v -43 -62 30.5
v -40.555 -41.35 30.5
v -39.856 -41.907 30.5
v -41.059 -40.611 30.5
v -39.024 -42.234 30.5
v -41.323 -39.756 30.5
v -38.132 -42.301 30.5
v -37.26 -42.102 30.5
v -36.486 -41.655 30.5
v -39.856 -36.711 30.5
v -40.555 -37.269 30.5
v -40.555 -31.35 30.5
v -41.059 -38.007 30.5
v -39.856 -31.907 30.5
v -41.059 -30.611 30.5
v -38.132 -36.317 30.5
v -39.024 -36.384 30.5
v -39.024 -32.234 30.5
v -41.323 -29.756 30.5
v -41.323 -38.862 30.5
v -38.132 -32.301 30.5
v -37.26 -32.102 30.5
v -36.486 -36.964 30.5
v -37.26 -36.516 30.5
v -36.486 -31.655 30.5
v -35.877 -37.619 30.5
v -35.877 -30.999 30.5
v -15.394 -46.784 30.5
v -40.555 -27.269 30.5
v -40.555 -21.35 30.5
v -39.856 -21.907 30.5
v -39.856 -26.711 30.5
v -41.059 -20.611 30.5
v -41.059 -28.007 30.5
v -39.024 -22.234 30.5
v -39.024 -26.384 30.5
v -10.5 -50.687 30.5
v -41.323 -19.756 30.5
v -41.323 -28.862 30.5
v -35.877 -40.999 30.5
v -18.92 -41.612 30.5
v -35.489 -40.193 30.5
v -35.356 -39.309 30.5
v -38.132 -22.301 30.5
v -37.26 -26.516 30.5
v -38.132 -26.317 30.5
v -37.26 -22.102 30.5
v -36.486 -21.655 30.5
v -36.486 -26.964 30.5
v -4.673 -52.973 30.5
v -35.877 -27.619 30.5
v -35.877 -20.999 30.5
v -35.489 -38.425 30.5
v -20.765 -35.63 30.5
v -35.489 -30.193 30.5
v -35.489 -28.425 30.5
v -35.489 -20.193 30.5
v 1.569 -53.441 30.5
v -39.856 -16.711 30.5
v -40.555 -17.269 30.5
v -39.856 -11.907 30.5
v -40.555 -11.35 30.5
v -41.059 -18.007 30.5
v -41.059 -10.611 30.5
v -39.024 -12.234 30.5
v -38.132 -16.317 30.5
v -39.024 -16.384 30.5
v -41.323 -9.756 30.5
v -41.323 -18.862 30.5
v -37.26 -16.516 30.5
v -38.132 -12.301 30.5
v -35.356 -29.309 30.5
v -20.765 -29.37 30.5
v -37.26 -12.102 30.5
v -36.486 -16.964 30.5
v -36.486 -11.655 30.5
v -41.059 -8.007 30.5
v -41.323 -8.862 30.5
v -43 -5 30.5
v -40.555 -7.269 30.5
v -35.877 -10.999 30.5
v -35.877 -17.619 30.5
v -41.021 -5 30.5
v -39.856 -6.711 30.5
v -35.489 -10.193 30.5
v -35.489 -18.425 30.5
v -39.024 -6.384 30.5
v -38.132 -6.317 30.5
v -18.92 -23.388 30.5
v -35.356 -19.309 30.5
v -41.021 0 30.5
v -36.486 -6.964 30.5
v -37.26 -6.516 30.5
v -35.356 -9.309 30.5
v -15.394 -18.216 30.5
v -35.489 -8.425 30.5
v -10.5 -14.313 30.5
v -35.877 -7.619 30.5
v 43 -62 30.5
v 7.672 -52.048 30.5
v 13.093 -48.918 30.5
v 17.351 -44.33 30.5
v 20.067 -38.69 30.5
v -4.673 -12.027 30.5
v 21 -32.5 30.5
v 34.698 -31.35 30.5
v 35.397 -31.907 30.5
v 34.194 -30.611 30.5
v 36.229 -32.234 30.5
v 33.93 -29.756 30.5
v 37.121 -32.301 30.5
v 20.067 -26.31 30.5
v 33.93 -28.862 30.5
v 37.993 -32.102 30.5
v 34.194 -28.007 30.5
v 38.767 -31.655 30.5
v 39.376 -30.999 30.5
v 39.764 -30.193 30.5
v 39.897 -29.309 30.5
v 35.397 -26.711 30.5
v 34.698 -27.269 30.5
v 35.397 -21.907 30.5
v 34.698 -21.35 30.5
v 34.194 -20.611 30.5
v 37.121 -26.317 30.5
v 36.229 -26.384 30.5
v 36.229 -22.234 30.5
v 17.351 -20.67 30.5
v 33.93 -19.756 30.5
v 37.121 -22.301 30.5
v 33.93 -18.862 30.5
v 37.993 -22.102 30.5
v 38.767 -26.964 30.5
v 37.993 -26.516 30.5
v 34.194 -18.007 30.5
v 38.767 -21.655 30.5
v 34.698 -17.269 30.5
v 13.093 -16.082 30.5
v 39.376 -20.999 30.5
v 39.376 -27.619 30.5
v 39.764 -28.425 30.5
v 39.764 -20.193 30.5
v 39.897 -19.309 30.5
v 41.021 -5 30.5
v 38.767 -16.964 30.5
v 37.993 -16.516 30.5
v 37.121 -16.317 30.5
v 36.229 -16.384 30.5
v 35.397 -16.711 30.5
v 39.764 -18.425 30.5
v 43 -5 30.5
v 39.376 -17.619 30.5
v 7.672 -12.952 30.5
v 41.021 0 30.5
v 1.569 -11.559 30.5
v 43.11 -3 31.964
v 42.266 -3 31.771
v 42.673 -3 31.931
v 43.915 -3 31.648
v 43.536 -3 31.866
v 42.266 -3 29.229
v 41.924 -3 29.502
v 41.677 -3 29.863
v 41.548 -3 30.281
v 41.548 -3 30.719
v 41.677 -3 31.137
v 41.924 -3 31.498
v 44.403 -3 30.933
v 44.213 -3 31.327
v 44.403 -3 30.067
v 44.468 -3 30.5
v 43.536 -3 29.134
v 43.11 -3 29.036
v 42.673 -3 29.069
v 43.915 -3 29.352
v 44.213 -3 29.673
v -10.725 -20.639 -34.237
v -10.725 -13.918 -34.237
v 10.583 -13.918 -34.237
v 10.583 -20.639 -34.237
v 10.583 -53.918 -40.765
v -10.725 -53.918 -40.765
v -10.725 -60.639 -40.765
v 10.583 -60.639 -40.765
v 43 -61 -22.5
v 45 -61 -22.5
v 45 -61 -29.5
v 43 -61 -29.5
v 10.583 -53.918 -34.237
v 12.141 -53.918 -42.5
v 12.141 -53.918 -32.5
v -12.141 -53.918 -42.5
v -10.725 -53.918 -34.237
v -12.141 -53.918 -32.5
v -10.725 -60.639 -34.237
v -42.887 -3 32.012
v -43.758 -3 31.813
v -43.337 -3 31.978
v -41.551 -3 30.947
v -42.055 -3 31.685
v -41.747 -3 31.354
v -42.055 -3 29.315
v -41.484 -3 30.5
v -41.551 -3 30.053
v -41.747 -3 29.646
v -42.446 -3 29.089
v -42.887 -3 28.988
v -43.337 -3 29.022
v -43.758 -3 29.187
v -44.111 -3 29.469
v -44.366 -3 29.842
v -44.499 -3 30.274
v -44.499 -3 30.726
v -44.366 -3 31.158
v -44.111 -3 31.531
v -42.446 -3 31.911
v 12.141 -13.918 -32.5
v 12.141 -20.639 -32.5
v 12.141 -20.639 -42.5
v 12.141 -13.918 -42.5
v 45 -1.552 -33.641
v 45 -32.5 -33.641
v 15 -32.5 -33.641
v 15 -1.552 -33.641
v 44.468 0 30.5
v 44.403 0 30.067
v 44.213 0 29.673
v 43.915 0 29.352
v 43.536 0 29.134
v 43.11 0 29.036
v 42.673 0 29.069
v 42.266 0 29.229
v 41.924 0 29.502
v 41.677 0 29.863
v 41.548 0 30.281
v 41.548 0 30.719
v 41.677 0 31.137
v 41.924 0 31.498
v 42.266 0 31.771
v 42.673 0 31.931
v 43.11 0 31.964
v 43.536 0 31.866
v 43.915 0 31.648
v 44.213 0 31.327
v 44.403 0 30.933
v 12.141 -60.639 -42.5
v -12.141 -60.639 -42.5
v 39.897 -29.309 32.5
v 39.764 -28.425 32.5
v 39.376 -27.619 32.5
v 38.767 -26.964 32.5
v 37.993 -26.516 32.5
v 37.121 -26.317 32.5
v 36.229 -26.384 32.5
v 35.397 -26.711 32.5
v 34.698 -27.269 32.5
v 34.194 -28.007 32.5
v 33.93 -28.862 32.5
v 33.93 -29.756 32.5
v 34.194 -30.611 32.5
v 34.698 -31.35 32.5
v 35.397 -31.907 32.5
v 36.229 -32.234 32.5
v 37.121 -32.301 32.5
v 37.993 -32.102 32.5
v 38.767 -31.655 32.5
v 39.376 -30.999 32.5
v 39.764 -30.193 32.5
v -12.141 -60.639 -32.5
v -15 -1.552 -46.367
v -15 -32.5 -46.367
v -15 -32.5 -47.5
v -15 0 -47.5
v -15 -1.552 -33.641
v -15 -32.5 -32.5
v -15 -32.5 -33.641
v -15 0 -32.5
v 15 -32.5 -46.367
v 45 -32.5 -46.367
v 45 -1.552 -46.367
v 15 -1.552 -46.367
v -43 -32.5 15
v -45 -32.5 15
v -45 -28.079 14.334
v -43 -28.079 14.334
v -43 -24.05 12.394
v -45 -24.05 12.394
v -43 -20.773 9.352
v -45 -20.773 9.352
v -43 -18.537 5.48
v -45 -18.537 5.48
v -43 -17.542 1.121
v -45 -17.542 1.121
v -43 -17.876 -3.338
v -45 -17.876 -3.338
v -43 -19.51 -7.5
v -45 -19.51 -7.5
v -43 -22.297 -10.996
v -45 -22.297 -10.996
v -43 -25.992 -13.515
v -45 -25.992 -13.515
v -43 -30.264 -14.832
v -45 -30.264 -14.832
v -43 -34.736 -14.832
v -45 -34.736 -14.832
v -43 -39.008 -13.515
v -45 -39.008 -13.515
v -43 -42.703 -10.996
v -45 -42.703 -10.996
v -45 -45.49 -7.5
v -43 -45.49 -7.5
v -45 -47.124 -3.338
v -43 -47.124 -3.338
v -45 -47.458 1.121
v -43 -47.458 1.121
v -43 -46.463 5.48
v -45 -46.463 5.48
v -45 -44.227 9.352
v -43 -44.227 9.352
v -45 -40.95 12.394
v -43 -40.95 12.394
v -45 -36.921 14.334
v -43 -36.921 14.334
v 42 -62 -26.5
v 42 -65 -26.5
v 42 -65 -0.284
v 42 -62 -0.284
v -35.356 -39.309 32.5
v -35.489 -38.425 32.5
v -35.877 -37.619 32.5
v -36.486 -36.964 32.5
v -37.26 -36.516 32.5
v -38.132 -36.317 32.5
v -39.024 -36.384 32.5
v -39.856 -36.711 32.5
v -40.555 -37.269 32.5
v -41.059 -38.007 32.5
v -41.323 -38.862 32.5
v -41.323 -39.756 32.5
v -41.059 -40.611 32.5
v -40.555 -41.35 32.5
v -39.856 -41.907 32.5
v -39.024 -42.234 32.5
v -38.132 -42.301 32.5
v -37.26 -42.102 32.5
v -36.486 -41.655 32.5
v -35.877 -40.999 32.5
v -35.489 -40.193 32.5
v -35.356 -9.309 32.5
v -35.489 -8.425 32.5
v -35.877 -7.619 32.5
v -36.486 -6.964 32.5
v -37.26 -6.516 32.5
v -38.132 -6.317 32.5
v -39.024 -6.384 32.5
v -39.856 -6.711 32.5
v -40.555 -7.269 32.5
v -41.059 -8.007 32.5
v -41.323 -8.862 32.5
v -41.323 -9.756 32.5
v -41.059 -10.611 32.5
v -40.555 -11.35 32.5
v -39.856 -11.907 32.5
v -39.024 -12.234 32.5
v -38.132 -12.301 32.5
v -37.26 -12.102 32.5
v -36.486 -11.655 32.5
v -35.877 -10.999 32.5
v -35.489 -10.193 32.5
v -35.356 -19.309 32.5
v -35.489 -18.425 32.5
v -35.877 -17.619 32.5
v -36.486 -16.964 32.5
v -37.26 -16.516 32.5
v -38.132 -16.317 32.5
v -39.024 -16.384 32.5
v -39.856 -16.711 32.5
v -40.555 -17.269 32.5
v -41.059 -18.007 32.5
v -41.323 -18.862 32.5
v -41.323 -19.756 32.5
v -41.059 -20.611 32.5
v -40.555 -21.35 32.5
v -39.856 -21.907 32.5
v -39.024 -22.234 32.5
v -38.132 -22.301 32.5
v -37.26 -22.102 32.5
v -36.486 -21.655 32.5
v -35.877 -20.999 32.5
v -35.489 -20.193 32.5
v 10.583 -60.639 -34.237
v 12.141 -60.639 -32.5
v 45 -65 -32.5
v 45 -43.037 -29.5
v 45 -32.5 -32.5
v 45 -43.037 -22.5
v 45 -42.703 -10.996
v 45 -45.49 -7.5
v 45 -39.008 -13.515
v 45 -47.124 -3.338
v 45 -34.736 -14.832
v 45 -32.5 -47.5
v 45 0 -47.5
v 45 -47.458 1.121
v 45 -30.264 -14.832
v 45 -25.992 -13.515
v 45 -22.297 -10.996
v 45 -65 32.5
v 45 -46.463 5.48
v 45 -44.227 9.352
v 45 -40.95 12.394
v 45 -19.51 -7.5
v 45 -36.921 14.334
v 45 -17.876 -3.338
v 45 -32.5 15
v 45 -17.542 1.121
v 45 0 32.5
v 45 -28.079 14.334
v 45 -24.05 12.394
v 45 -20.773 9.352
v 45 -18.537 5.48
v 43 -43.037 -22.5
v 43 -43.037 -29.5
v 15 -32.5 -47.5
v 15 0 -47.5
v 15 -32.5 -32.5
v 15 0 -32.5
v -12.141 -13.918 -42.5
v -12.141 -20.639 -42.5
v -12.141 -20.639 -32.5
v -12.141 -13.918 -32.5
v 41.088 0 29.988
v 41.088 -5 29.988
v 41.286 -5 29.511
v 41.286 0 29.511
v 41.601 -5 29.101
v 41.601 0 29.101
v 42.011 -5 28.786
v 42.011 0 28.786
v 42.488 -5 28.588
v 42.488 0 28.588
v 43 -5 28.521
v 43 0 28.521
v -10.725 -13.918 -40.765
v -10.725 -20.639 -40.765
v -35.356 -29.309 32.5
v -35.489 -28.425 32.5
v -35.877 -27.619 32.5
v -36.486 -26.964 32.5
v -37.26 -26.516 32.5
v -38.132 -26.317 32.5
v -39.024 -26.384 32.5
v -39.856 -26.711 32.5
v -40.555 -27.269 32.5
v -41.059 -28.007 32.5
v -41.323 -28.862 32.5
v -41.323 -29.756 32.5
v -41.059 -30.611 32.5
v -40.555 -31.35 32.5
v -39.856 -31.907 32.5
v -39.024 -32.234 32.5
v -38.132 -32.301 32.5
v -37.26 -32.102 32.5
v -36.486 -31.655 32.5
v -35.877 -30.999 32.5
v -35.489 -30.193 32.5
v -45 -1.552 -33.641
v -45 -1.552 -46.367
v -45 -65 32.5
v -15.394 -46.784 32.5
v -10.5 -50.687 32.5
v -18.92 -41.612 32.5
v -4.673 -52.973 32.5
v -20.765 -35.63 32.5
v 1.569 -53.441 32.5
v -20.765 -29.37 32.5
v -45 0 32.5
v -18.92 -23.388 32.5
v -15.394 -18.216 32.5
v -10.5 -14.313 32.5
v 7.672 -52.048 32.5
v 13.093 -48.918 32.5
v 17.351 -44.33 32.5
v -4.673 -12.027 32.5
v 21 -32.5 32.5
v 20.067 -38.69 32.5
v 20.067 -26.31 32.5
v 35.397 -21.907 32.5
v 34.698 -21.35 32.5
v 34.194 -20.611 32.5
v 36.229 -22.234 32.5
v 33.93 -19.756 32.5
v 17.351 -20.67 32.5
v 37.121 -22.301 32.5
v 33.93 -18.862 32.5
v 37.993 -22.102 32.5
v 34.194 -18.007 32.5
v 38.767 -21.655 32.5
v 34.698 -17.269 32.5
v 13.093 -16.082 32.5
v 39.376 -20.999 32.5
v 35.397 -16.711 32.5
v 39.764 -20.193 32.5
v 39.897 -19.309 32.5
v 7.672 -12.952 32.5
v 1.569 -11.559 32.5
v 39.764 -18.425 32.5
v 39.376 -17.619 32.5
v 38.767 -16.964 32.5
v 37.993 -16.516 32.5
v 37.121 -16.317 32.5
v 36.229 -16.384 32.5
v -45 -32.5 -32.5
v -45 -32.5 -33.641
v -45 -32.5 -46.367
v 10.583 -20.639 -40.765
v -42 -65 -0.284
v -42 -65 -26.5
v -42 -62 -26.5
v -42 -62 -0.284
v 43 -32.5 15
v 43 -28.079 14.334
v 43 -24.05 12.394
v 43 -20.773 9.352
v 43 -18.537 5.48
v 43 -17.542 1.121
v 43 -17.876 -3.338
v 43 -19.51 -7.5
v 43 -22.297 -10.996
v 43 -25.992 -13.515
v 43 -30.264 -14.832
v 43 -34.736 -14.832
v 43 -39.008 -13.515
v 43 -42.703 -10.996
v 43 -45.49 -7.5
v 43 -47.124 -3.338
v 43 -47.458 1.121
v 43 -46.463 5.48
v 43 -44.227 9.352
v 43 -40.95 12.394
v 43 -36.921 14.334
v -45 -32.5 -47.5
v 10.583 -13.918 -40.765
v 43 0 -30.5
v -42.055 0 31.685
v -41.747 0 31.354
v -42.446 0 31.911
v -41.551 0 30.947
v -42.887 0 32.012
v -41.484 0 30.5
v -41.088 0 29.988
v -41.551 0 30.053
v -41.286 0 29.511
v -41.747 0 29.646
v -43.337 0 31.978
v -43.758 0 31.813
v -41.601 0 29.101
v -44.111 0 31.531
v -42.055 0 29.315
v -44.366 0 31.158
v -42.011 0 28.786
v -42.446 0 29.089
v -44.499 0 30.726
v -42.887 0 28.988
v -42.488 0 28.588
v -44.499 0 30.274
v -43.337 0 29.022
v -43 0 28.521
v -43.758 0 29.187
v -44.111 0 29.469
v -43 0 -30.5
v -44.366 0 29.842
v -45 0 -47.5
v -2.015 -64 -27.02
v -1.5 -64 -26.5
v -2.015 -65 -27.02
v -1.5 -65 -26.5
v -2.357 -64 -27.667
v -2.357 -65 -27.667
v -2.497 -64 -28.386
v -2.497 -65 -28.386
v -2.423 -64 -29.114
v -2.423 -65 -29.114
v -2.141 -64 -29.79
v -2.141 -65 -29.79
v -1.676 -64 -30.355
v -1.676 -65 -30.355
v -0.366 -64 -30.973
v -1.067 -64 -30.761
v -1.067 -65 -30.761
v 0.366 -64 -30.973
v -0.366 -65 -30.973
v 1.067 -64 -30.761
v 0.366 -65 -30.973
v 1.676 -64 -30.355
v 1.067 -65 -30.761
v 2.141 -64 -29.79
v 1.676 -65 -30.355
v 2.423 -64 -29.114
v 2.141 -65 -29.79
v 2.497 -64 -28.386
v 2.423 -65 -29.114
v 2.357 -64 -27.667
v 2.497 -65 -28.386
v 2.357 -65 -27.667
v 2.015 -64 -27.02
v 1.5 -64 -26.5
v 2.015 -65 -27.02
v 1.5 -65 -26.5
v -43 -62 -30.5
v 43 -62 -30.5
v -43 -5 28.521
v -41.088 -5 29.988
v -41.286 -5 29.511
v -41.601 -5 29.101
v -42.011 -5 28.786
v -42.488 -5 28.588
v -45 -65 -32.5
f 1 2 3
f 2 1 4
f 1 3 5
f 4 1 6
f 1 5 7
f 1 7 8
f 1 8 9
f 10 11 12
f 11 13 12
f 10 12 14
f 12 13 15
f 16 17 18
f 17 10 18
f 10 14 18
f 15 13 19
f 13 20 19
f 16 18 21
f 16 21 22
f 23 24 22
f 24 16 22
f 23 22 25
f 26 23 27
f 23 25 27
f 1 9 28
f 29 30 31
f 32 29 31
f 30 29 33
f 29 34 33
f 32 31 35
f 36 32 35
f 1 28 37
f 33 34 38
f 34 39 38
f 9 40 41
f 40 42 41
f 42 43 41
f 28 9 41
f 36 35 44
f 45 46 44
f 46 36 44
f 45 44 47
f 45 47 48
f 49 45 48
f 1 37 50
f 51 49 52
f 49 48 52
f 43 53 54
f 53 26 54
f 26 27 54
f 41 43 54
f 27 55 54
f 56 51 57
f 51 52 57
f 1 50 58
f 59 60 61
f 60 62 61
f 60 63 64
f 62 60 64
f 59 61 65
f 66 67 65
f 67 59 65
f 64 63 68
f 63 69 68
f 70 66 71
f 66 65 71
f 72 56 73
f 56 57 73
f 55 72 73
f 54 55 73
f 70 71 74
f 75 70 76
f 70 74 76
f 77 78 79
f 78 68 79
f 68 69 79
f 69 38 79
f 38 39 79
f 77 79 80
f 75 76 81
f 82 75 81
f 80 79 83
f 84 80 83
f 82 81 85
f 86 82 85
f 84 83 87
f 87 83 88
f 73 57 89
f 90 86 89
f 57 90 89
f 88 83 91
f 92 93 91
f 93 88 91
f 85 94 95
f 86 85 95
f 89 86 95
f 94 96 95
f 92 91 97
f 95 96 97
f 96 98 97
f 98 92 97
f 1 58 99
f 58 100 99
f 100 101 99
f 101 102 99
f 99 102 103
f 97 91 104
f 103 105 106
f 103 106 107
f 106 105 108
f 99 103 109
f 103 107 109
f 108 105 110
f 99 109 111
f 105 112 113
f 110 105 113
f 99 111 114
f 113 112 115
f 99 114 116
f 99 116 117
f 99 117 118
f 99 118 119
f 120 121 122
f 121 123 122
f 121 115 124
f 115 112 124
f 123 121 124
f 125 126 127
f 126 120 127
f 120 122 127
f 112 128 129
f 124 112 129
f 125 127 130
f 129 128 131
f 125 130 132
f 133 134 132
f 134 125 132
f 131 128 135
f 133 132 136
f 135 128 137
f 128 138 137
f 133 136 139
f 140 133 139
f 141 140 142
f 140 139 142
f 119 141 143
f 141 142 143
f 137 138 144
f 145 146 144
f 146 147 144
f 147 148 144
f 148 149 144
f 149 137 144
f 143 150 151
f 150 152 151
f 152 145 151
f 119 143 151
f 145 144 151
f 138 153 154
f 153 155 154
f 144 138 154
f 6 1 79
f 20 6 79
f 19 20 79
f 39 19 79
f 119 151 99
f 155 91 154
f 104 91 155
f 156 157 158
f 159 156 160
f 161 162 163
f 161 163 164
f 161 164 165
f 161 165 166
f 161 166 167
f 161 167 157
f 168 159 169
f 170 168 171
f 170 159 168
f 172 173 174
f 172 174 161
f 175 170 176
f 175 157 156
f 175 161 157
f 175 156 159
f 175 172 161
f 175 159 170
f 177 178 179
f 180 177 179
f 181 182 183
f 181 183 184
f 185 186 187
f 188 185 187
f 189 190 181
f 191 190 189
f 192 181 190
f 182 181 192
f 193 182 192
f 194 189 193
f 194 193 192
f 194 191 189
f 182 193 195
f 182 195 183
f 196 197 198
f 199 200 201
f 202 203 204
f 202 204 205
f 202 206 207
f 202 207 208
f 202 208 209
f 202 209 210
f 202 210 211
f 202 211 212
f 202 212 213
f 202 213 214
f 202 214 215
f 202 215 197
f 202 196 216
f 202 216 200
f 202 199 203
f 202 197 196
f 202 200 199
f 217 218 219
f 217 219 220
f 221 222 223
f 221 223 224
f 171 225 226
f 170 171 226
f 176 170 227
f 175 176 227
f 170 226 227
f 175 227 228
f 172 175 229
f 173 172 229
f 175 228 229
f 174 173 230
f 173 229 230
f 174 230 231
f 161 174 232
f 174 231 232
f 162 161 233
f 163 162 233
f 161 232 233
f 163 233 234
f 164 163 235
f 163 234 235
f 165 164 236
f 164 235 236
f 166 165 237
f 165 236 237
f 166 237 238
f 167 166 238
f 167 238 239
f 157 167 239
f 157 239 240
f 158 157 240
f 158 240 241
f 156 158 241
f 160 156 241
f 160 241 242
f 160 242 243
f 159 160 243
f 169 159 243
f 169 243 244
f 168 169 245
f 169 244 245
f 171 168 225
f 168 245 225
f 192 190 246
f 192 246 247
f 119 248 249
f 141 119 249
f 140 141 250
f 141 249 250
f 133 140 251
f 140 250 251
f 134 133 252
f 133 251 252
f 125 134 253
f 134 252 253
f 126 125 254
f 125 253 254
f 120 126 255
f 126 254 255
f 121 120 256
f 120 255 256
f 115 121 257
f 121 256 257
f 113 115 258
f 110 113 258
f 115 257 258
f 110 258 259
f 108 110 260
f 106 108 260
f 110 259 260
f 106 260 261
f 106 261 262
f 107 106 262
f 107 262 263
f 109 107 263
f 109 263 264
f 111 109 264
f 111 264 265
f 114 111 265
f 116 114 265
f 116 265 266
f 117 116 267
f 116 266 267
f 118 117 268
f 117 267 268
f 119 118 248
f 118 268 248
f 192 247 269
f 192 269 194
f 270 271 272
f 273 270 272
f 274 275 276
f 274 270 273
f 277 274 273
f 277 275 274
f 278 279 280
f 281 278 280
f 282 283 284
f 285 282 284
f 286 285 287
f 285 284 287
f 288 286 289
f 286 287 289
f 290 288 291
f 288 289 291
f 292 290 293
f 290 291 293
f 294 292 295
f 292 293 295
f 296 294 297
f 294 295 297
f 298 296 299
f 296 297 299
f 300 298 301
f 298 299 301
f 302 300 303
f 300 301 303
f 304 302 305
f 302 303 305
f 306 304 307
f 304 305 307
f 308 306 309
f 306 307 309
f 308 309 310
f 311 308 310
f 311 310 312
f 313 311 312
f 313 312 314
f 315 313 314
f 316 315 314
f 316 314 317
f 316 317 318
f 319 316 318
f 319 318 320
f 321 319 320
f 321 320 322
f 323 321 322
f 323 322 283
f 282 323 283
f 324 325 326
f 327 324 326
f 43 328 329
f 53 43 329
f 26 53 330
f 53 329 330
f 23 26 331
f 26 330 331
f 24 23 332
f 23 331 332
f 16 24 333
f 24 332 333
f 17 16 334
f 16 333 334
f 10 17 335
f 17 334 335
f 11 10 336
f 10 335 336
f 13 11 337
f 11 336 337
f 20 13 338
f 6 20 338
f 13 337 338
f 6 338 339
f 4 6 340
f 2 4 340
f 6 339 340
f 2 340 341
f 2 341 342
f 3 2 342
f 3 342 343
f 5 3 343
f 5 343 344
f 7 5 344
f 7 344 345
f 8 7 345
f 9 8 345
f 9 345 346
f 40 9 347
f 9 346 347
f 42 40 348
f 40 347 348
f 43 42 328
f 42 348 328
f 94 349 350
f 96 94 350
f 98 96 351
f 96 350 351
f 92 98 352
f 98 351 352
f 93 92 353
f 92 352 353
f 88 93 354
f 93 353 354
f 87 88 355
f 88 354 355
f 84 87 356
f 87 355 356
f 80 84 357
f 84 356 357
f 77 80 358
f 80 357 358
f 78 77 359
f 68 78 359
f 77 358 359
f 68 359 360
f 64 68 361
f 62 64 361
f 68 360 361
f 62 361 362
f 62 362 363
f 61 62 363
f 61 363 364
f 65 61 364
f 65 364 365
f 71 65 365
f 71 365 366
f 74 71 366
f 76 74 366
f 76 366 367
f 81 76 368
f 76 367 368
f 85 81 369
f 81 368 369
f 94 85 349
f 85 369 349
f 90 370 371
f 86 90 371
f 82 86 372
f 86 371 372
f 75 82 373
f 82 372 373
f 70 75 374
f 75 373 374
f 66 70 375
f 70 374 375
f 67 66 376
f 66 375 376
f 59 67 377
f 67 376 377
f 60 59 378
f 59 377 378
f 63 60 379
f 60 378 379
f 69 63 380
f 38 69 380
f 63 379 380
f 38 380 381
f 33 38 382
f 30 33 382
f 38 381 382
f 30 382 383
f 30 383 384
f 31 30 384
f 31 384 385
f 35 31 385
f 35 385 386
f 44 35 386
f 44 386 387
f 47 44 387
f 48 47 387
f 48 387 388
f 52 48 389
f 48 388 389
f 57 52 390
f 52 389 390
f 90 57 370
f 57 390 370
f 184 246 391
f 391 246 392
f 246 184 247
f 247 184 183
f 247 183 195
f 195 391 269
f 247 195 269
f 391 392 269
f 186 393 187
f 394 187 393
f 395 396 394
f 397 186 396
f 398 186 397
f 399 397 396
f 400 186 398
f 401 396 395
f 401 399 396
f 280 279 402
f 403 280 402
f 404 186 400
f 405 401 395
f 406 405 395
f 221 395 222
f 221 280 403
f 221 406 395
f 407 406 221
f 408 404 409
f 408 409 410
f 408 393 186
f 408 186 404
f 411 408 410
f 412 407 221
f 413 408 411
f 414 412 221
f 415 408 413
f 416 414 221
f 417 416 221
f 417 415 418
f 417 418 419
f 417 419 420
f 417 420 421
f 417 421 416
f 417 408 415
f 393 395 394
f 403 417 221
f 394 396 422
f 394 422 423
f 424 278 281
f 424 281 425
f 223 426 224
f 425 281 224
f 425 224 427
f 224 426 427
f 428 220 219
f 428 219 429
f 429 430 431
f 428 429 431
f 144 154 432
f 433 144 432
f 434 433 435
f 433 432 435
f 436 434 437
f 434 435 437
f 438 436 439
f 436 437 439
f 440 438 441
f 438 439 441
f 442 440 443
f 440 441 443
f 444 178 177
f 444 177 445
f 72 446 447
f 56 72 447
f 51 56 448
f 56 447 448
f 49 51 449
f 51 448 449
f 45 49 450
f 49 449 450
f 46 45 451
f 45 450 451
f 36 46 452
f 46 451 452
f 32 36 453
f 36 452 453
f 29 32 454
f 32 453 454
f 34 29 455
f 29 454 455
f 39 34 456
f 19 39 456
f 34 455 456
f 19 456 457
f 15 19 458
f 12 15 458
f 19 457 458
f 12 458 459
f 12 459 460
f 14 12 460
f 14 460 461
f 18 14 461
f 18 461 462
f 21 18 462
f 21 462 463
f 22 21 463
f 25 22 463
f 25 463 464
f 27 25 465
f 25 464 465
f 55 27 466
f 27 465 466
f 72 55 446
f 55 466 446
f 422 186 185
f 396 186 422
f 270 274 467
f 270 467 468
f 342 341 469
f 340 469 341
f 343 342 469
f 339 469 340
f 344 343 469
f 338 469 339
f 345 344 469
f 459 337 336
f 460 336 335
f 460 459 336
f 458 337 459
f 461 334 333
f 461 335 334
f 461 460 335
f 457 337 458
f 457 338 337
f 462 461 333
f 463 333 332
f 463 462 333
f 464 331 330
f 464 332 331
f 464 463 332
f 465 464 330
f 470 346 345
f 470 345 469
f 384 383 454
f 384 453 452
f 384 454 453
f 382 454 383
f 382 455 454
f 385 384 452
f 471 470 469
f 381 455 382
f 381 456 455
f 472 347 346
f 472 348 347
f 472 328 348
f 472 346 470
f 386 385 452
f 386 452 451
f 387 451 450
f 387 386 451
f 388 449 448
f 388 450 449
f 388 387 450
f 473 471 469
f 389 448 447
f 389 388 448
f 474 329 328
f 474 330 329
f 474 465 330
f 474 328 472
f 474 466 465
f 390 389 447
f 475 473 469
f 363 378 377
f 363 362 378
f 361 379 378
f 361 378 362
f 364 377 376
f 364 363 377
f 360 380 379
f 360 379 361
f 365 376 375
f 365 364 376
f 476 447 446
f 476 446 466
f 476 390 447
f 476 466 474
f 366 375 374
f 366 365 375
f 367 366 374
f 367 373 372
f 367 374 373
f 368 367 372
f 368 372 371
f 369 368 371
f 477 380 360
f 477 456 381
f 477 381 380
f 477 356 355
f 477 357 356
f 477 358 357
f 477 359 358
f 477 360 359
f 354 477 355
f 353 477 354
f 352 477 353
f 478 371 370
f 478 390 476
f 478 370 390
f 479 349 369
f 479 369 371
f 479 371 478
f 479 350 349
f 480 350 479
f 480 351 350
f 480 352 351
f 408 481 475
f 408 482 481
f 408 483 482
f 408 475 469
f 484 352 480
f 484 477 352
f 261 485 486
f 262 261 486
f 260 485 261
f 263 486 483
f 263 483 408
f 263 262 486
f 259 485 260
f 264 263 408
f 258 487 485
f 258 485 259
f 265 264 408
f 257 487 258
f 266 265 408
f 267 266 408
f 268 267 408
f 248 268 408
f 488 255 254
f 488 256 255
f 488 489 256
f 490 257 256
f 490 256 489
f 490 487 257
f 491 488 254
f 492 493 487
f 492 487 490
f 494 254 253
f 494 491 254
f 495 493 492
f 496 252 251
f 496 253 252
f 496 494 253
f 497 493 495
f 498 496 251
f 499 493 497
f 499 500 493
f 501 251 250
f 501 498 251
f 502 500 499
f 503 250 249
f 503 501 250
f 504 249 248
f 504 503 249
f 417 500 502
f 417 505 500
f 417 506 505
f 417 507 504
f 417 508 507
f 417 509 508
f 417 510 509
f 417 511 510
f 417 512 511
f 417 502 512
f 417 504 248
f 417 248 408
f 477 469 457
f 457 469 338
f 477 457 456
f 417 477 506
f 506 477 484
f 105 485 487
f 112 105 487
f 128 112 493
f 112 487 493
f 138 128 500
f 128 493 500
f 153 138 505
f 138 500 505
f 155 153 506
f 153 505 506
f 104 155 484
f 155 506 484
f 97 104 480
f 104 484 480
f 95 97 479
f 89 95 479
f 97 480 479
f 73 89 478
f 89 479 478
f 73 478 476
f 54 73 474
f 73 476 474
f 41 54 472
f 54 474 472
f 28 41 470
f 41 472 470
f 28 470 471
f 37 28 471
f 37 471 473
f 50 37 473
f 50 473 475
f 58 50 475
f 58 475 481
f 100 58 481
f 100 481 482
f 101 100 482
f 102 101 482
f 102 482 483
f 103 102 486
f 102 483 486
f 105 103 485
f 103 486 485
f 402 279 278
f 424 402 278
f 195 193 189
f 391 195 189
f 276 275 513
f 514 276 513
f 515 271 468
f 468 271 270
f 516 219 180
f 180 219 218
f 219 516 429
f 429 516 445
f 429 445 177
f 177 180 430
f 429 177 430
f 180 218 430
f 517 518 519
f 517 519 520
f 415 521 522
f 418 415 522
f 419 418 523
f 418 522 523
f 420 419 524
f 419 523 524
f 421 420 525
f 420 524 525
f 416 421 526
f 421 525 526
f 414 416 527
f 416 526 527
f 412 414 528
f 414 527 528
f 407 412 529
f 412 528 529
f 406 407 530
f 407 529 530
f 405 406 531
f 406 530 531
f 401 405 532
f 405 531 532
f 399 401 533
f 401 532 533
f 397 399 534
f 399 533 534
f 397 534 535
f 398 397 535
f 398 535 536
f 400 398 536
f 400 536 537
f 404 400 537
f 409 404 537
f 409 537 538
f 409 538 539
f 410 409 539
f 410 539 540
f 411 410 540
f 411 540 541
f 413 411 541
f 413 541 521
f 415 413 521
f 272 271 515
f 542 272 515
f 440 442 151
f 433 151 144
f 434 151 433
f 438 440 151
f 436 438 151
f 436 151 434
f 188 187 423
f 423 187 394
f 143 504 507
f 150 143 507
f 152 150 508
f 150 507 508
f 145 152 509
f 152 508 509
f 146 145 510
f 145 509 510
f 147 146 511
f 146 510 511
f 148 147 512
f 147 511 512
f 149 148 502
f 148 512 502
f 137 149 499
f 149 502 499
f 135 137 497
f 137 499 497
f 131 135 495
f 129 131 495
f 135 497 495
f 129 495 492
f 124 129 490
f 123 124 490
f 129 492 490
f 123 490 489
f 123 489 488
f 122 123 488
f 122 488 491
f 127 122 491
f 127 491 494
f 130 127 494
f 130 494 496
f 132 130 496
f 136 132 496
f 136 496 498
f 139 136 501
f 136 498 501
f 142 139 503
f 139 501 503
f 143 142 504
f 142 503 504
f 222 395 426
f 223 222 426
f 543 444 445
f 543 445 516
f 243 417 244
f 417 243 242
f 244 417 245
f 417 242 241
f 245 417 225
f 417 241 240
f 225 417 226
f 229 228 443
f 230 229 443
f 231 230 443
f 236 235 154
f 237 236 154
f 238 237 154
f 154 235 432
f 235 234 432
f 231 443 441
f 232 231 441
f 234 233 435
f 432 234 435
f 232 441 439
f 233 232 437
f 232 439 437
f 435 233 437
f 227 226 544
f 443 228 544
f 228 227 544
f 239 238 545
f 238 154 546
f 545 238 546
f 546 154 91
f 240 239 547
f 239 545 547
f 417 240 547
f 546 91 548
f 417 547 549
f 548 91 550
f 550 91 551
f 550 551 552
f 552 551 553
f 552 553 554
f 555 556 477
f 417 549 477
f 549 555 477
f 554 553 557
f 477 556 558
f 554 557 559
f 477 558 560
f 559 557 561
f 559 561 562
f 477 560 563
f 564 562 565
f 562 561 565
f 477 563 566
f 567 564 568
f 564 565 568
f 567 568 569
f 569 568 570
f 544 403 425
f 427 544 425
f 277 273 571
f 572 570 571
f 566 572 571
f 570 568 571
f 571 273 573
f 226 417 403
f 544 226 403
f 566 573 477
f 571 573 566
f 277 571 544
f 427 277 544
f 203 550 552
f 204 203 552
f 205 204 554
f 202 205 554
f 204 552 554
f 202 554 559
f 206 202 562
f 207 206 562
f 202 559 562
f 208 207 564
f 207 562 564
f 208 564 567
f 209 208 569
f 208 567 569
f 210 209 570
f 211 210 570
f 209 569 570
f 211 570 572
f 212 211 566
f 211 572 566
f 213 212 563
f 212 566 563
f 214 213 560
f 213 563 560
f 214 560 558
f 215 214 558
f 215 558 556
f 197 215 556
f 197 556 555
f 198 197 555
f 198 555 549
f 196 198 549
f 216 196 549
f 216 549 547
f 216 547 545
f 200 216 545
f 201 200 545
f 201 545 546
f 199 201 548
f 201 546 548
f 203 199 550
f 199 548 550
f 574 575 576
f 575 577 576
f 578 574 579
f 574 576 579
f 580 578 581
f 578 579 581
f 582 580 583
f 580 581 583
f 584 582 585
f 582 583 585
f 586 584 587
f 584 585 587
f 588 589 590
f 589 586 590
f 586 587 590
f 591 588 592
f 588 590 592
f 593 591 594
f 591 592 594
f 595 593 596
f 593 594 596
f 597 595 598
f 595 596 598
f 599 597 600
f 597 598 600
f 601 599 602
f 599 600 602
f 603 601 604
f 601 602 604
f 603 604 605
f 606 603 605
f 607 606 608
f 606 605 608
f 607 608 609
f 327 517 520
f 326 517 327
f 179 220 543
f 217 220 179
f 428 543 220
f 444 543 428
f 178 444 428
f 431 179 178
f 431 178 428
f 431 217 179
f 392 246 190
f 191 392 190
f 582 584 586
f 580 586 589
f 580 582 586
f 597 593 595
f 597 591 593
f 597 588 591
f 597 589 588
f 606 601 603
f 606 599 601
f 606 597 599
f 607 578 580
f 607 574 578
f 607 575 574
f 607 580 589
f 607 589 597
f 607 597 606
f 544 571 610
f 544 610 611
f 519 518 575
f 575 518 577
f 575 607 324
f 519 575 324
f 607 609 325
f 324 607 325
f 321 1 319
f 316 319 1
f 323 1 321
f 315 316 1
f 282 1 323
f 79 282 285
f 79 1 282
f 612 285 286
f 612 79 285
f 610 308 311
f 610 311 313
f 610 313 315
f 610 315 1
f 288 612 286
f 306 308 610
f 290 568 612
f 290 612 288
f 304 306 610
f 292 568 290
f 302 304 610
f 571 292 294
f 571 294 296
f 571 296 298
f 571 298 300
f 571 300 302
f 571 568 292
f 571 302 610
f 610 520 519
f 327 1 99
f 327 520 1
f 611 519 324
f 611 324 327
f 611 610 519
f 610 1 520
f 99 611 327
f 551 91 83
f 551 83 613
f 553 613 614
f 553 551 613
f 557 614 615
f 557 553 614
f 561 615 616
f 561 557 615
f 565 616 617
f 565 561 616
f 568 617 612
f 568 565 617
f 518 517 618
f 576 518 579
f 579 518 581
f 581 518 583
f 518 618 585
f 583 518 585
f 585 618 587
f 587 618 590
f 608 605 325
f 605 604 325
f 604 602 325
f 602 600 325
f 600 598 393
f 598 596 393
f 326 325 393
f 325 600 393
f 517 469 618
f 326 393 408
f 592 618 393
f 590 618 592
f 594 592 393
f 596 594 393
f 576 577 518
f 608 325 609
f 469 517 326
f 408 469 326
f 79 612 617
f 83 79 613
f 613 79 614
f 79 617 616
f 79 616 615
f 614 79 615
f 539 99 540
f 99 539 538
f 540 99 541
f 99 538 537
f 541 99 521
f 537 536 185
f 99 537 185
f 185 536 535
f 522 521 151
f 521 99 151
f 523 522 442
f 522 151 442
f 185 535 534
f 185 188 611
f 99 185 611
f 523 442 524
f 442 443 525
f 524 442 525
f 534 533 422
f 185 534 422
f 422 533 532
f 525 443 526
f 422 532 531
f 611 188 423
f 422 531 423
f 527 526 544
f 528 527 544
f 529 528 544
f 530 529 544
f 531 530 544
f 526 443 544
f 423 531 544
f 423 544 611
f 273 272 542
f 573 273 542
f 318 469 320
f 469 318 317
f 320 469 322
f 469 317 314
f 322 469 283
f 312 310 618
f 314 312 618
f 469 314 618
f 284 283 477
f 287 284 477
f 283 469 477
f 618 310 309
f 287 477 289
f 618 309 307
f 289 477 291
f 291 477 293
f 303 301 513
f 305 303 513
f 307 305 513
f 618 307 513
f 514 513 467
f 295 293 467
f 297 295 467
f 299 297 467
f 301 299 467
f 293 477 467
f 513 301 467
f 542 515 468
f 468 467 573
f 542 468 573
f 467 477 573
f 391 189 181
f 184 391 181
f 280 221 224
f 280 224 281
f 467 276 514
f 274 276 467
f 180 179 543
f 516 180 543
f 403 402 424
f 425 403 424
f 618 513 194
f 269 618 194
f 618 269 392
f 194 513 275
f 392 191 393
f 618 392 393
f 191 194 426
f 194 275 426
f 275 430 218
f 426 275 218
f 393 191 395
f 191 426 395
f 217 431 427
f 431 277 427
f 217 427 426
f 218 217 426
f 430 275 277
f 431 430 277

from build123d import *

# Parameters (mm, degrees)
SKETCH7_W           = 90
SKETCH7_H           = 65
BOSS_EXTRUDE2_DEPTH = 65
SKETCH10_W          = 86
SKETCH10_H          = 61
CUT_EXTRUDE2_DEPTH  = 62
SKETCH12_R          = 15
CUT_EXTRUDE3_DEPTH  = 91
SKETCH13_R          = 21
SKETCH13_R_2        = 3
CUT_EXTRUDE4_DEPTH  = 2
SKETCH14_W          = 7
SKETCH14_H          = 17.962946586
CUT_EXTRUDE5_DEPTH  = 5
SKETCH15_W          = 84
SKETCH15_H          = 26.21557427
CUT_EXTRUDE6_DEPTH  = 5
SKETCH17_W          = 30
SKETCH17_H          = 32.5
BOSS_EXTRUDE3_DEPTH = 15
SKETCH18_W          = 12.726486876
SKETCH18_H          = 30.948281703
CUT_EXTRUDE7_DEPTH  = 91
SKETCH20_W          = 24.28117476
SKETCH20_H          = 6.721130416
BOSS_EXTRUDE4_DEPTH = 10
SKETCH21_W          = 21.308601662
SKETCH21_H          = 6.528068718
CUT_EXTRUDE9_DEPTH  = 52.082060801
BOSS_EXTRUDE5_DEPTH = 5
SKETCH24_R          = 1.516132664
SKETCH24_R_2        = 1.46792115
CUT_EXTRUDE10_DEPTH = 3
SKETCH25_R          = 2.5
CUT_EXTRUDE11_DEPTH = 1


with BuildPart() as part:
    # Sketch7 → Boss-Extrude2 (new body)
    with BuildSketch(Plane(origin=(0, 0, 0), x_dir=(1, 0, 0), z_dir=(0, 1, 0))):
        Rectangle(SKETCH7_W, SKETCH7_H)
    extrude(amount=-BOSS_EXTRUDE2_DEPTH)

    # Sketch10 → Cut-Extrude2 (cut)
    with BuildSketch(Plane(origin=(0, 0, 0), x_dir=(1, 0, 0), z_dir=(0, 1, 0))):
        Rectangle(SKETCH10_W, SKETCH10_H)
    extrude(amount=-CUT_EXTRUDE2_DEPTH, mode=Mode.SUBTRACT)

    # Sketch12 → Cut-Extrude3 (cut, through all)
    with BuildSketch(Plane.ZY.offset(45)):
        with Locations((0, -32.5)):
            Circle(SKETCH12_R)
    extrude(amount=-CUT_EXTRUDE3_DEPTH, mode=Mode.SUBTRACT)

    # Sketch13 → Cut-Extrude4 (cut)
    with BuildSketch(Plane.XY.offset(32.5)):
        with Locations((0, -32.5)):
            Circle(SKETCH13_R)
        with Locations((-38.356194479, -9.309094371)):
            Circle(SKETCH13_R_2)
        with Locations((-38.356194479, -19.309094371)):
            Circle(SKETCH13_R_2)
        with Locations((-38.356194479, -29.309094371)):
            Circle(SKETCH13_R_2)
        with Locations((-38.356194479, -39.309094371)):
            Circle(SKETCH13_R_2)
        with Locations((36.896991428, -19.309094371)):
            Circle(SKETCH13_R_2)
        with Locations((36.896991428, -29.309094371)):
            Circle(SKETCH13_R_2)
    extrude(amount=-CUT_EXTRUDE4_DEPTH, mode=Mode.SUBTRACT)

    # Sketch14 → Cut-Extrude5 (cut)
    with BuildSketch(Plane(origin=(45, 0, 0), x_dir=(0, 0, -1), z_dir=(1, 0, 0))):
        with Locations((26, -52.018526707)):
            Rectangle(SKETCH14_W, SKETCH14_H)
    extrude(amount=-CUT_EXTRUDE5_DEPTH, mode=Mode.SUBTRACT)

    # Sketch15 → Cut-Extrude6 (cut)
    with BuildSketch(Plane.XZ.offset(65)):
        with Locations((0, -13.392212865)):
            Rectangle(SKETCH15_W, SKETCH15_H)
    extrude(amount=-CUT_EXTRUDE6_DEPTH, mode=Mode.SUBTRACT)

    # Sketch17 → Boss-Extrude3 (add)
    with BuildSketch(Plane(origin=(0, 0, -32.5), x_dir=(-1, 0, 0), z_dir=(0, 0, -1))):
        with Locations((-30, -16.25)):
            Rectangle(SKETCH17_W, SKETCH17_H)
        with Locations((30, -16.25)):
            Rectangle(SKETCH17_W, SKETCH17_H)
    extrude(amount=BOSS_EXTRUDE3_DEPTH)

    # Sketch18 → Cut-Extrude7 (cut, through all)
    with BuildSketch(Plane(origin=(45, 0, 0), x_dir=(0, 0, -1), z_dir=(1, 0, 0))):
        with Locations((40.003797932, -17.025859149)):
            Rectangle(SKETCH18_W, SKETCH18_H)
    extrude(amount=-CUT_EXTRUDE7_DEPTH, mode=Mode.SUBTRACT)

    # Sketch20 → Boss-Extrude4 (add)
    with BuildSketch(Plane(origin=(0, 0, -32.5), x_dir=(-1, 0, 0), z_dir=(0, 0, -1))):
        with Locations((0, -57.278504407)):
            Rectangle(SKETCH20_W, SKETCH20_H)
        with Locations((0, -17.278504407)):
            Rectangle(SKETCH20_W, SKETCH20_H)
    extrude(amount=BOSS_EXTRUDE4_DEPTH)

    # Sketch21 → Cut-Extrude9 (cut, through all)
    with BuildSketch(Plane(origin=(0, -13.917939199, 0), x_dir=(1, 0, 0), z_dir=(0, 1, 0))):
        with Locations((-0.070940944, 37.501061987)):
            Rectangle(SKETCH21_W, SKETCH21_H)
    extrude(amount=-CUT_EXTRUDE9_DEPTH, mode=Mode.SUBTRACT)

    # Sketch23 → Boss-Extrude5 (add)
    with BuildSketch(Plane(origin=(0, 0, 0), x_dir=(1, 0, 0), z_dir=(0, 1, 0))):
        with BuildLine():
            Line((43, -28.521055724), (43, -30.5))
            Line((43, -30.5), (41.021055724, -30.5))
            ThreePointArc((41.021055724, -30.5), (41.600675083, -29.100675083), (43, -28.521055724))
        make_face()
        with BuildLine():
            Line((-43, -28.521055724), (-43, -30.5))
            Line((-43, -30.5), (-41.021055724, -30.5))
            ThreePointArc((-41.021055724, -30.5), (-41.600675083, -29.100675083), (-43, -28.521055724))
        make_face()
    extrude(amount=-BOSS_EXTRUDE5_DEPTH)

    # Sketch24 → Cut-Extrude10 (cut)
    with BuildSketch(Plane(origin=(0, 0, 0), x_dir=(1, 0, 0), z_dir=(0, 1, 0))):
        with Locations((-43, -30.5)):
            Circle(SKETCH24_R)
        with Locations((43, -30.5)):
            Circle(SKETCH24_R_2)
    extrude(amount=-CUT_EXTRUDE10_DEPTH, mode=Mode.SUBTRACT)

    # Sketch25 → Cut-Extrude11 (cut)
    with BuildSketch(Plane.XZ.offset(65)):
        with Locations((0, -28.5)):
            Circle(SKETCH25_R)
    extrude(amount=-CUT_EXTRUDE11_DEPTH, mode=Mode.SUBTRACT)


solid = part.part
